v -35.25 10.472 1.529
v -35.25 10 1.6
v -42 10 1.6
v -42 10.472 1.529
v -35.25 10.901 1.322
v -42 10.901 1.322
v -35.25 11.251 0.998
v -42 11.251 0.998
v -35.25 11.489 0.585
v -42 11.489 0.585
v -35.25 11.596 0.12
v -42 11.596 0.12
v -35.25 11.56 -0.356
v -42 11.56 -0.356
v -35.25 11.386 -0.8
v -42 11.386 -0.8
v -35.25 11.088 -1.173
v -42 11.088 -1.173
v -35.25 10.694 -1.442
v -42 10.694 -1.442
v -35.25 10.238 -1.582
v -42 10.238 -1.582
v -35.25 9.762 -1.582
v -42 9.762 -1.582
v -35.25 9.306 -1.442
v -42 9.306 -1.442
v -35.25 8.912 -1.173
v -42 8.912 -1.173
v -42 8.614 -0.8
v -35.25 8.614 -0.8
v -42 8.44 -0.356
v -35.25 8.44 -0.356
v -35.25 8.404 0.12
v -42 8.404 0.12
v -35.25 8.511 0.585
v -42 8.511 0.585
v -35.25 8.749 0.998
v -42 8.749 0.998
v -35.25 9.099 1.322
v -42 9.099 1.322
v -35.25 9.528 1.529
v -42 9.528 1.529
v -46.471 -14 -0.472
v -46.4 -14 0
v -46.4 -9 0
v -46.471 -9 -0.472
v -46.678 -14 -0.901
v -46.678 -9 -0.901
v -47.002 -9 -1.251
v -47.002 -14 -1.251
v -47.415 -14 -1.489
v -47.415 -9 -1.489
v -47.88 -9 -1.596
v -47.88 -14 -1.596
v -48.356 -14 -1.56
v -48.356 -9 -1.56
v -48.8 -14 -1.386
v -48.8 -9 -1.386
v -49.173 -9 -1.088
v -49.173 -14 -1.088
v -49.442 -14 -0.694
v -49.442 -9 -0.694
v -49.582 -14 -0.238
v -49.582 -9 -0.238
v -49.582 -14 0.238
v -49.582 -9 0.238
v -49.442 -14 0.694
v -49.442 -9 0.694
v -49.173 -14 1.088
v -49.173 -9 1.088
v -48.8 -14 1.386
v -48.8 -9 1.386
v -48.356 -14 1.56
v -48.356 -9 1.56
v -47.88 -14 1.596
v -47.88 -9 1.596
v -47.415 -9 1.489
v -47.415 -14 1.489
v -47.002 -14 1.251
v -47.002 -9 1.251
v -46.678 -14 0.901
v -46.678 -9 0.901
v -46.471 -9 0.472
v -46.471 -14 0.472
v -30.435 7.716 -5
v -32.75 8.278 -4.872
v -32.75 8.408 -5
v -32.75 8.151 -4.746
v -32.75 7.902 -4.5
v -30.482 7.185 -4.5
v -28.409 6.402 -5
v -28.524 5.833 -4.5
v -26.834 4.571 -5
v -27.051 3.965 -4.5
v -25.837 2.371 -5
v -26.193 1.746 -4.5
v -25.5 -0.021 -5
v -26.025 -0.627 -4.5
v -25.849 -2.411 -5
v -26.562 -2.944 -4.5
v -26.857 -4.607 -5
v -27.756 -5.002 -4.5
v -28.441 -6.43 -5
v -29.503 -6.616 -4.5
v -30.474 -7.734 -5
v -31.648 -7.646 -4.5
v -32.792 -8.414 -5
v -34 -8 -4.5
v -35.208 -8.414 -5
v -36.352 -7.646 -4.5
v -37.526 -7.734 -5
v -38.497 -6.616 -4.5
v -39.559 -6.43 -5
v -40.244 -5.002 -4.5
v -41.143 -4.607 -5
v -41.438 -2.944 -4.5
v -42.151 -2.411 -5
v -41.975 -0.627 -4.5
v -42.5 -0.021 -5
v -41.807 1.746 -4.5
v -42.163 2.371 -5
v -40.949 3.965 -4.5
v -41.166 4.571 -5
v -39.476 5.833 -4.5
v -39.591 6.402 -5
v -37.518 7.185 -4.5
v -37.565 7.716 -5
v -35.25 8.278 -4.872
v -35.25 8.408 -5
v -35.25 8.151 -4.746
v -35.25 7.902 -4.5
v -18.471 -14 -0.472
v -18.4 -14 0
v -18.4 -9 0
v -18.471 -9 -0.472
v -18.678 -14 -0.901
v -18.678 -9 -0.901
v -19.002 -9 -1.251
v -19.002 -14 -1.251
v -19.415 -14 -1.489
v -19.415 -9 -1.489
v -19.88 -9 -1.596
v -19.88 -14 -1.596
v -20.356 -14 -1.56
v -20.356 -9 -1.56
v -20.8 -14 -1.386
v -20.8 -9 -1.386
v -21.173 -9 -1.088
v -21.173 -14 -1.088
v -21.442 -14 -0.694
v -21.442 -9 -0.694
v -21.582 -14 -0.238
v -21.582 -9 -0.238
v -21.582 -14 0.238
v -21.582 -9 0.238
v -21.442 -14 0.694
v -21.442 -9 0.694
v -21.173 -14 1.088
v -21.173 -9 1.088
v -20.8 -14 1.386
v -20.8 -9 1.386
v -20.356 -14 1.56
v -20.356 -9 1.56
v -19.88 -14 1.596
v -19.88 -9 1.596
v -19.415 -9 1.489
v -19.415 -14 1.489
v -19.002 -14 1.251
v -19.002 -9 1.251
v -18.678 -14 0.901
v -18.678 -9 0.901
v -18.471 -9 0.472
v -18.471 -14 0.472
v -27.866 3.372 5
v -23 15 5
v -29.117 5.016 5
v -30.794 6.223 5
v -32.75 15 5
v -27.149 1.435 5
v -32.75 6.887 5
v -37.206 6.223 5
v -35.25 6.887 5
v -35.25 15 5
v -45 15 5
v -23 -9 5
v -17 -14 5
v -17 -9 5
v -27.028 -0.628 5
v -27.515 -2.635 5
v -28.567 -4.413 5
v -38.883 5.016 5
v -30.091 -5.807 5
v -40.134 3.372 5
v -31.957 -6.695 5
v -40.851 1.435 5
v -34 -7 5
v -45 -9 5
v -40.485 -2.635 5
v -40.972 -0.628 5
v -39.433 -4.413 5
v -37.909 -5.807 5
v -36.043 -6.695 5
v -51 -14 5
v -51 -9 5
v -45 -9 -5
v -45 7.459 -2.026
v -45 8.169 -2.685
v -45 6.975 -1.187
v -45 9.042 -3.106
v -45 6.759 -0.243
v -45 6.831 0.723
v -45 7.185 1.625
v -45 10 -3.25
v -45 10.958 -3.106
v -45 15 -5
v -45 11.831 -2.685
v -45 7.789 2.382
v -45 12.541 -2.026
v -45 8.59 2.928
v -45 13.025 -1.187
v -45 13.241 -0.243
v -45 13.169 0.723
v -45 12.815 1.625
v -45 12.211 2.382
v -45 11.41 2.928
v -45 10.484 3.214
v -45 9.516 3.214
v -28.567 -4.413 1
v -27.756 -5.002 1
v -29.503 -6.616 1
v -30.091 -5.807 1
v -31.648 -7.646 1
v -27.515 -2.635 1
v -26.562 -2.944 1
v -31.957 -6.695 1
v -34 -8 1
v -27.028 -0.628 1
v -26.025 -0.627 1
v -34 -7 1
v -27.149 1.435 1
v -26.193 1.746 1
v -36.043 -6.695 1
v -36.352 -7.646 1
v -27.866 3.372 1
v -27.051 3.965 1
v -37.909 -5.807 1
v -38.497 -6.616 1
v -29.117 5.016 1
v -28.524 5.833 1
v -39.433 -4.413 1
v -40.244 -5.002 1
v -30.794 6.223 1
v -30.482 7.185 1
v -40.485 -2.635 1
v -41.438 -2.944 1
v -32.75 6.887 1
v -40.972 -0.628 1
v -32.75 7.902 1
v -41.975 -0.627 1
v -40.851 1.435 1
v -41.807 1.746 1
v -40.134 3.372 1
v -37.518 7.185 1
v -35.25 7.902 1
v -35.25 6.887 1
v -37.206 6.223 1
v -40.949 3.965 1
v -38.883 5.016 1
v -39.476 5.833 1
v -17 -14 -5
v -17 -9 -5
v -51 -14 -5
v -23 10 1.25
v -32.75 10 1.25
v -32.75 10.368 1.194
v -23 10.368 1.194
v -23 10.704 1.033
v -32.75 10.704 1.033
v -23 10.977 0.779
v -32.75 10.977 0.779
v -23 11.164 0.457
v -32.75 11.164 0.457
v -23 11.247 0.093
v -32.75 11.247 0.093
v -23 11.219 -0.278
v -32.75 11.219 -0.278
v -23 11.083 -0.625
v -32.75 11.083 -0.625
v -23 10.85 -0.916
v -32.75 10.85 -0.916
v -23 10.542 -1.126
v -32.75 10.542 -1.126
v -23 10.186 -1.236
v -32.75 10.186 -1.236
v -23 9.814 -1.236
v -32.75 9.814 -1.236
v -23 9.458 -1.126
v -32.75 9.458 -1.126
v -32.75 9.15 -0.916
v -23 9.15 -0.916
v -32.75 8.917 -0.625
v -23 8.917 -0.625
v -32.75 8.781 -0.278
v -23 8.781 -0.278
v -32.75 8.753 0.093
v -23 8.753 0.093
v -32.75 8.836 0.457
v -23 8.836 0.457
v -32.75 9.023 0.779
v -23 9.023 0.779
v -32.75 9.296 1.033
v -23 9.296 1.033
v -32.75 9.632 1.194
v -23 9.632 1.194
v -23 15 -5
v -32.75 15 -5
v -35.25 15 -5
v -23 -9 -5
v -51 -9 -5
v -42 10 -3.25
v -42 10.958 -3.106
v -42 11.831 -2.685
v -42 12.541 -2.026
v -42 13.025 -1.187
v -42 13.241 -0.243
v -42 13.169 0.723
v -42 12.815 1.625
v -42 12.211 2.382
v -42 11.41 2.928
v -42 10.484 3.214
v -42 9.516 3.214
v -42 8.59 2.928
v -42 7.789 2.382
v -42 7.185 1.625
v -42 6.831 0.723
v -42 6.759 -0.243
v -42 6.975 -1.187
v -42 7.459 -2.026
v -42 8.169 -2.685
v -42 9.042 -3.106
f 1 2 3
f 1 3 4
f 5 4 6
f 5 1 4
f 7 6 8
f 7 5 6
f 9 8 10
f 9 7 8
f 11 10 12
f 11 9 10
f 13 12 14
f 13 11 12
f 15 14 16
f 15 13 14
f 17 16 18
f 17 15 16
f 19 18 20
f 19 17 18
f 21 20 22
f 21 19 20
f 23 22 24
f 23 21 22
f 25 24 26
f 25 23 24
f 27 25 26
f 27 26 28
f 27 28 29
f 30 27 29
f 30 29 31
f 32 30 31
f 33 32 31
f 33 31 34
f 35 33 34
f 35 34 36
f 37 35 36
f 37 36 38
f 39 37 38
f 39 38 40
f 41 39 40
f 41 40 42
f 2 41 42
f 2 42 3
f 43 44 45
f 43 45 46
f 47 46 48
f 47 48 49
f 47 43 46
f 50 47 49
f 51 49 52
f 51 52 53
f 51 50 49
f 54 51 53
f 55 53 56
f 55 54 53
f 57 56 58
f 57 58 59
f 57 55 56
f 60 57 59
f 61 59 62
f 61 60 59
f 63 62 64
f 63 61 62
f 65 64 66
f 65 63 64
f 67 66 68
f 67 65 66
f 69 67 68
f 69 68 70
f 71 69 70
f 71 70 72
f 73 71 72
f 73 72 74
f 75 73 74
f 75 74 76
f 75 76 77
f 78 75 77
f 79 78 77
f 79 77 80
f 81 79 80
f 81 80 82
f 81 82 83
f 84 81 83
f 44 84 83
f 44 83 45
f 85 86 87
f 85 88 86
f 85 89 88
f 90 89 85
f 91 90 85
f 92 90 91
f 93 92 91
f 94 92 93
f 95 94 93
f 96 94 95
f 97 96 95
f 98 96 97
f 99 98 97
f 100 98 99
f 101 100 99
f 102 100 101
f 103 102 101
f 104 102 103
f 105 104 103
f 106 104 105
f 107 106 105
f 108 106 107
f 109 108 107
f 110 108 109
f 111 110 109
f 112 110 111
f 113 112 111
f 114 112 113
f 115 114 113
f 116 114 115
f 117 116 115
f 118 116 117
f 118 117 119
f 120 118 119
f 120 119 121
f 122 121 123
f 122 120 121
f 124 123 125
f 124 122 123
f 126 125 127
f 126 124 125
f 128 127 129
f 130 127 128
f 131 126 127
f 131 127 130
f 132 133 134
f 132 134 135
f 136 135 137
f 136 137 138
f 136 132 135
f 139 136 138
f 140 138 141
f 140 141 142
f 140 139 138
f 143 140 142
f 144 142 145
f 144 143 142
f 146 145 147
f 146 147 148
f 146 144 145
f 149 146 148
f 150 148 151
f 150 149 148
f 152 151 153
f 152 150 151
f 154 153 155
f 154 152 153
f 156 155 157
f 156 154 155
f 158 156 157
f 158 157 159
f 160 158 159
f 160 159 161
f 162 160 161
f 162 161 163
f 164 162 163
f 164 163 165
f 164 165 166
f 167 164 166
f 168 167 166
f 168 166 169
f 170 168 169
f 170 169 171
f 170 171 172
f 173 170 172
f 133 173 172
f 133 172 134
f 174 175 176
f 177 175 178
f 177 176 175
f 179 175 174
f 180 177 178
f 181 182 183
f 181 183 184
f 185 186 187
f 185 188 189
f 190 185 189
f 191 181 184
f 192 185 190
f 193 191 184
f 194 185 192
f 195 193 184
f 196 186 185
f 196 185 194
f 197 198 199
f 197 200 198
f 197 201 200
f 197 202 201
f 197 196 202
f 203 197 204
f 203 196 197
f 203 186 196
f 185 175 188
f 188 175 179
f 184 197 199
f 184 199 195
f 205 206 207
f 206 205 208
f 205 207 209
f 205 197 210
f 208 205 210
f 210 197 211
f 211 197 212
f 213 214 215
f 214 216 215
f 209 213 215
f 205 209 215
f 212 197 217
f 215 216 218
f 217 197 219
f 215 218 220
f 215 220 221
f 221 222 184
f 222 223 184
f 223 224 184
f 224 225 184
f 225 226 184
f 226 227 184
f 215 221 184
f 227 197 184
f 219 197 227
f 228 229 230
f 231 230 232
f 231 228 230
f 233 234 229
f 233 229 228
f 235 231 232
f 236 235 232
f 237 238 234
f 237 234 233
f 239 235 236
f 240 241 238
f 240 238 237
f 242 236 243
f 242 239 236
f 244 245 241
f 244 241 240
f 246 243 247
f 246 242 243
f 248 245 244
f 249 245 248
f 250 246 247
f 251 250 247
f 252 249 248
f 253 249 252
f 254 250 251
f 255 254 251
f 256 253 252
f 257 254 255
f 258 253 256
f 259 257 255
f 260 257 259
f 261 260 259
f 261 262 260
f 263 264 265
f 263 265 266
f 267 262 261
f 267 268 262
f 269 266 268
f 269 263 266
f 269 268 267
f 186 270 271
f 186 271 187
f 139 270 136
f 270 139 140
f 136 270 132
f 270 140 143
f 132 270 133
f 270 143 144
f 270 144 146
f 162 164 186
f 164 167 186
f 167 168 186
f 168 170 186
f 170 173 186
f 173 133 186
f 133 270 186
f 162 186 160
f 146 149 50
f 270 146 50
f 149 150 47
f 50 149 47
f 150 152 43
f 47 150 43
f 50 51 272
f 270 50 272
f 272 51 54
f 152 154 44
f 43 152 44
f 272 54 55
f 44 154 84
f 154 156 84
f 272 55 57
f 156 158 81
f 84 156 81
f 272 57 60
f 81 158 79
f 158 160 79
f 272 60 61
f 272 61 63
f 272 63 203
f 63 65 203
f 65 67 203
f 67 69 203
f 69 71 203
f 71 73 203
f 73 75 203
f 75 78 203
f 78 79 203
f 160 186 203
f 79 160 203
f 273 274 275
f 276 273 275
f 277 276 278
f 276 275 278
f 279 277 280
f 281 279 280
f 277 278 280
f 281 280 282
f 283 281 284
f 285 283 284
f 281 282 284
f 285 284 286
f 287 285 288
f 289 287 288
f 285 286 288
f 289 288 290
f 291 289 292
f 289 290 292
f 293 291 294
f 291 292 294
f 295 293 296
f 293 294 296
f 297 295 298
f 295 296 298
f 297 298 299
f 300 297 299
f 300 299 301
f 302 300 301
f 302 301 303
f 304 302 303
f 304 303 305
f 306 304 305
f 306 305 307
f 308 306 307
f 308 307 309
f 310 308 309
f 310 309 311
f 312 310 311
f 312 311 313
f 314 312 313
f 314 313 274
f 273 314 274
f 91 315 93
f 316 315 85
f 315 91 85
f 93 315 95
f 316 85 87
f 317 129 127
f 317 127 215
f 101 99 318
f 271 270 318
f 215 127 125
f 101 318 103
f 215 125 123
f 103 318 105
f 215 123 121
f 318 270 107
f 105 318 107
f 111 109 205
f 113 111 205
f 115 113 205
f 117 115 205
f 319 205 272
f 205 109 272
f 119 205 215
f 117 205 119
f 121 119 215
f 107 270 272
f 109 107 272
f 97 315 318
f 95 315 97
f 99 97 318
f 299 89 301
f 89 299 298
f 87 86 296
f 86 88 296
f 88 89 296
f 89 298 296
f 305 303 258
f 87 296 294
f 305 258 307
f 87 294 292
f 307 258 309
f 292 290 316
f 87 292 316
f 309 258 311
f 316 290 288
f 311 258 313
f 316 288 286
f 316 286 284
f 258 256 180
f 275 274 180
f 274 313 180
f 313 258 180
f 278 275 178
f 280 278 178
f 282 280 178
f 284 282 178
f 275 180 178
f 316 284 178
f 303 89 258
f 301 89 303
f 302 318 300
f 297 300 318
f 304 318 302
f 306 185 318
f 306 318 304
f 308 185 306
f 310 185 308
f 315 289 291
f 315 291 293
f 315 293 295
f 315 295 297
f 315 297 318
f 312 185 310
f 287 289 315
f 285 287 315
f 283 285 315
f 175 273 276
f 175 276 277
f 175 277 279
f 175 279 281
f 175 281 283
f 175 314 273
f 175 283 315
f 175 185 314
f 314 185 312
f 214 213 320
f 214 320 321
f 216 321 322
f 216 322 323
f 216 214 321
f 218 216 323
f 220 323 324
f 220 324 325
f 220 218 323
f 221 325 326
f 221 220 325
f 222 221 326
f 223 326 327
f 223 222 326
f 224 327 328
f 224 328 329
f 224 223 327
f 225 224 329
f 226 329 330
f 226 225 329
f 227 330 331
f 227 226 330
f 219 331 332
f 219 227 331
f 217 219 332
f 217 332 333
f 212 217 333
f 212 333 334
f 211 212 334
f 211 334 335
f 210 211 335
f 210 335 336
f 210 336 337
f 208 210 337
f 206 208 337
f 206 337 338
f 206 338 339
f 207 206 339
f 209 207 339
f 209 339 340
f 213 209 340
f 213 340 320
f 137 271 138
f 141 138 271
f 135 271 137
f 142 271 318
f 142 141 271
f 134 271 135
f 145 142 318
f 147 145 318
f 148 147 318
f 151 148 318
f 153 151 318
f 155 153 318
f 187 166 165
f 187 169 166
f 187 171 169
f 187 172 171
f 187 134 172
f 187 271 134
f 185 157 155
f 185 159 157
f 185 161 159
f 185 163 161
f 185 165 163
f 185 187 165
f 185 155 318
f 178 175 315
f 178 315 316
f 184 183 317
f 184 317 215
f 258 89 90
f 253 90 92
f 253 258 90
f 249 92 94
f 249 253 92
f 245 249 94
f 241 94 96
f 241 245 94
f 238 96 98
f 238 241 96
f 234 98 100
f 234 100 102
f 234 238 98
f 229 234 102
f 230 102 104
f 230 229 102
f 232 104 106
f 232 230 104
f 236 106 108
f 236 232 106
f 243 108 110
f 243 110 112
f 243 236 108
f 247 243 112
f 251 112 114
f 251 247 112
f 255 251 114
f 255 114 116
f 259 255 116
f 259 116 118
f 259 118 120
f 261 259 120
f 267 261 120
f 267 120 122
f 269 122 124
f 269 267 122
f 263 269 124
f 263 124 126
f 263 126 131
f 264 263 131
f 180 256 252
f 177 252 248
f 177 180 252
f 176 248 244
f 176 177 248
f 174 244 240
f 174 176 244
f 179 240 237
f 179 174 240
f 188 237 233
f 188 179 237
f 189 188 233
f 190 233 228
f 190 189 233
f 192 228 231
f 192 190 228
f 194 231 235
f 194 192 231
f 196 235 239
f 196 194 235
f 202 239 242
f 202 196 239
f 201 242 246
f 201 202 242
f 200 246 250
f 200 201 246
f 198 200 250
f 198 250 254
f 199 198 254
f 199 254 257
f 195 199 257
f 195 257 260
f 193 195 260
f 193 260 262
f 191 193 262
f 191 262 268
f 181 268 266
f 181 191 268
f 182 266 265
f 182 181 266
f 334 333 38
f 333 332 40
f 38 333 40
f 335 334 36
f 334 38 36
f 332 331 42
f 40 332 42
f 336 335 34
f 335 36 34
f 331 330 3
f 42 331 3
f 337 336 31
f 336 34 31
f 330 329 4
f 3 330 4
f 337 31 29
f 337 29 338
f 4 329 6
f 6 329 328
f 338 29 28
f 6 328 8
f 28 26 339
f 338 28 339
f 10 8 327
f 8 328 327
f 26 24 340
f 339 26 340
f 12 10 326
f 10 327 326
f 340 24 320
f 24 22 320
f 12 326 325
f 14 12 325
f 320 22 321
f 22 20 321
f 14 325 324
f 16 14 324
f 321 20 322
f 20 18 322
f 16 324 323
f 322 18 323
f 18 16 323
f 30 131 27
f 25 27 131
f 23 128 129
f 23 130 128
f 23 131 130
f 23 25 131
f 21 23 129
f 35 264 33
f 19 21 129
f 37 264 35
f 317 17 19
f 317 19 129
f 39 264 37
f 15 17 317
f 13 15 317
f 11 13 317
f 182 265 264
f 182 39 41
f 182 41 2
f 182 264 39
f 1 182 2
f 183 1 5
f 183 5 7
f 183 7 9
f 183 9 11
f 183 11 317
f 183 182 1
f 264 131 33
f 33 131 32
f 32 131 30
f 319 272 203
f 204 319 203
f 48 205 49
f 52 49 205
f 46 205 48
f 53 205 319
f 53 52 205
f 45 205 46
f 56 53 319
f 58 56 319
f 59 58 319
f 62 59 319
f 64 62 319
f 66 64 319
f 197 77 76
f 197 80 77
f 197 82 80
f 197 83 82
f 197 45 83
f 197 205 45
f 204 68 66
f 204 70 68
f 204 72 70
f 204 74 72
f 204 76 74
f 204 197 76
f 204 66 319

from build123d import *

# Parameters (mm, degrees)
SKETCH1_W                      = 22
SKETCH1_H                      = 29
BOSS_EXTRUDE1_DEPTH            = 5
SKETCH3_W                      = 34
SKETCH3_H                      = 10
BOSS_EXTRUDE2_DEPTH            = 5
F_16_0_16_DIAMETER_HOLE1_D     = 16
F_16_0_16_DIAMETER_HOLE1_DEPTH = 6
F_14_0_14_DIAMETER_HOLE1_D     = 14
M3_CLEARANCE_HOLE1_D           = 3.2
SKETCH12_W                     = 2.5
SKETCH12_H                     = 8.112511343
CUT_EXTRUDE1_DEPTH             = 25.779023387
CBORE_FOR_M3_SHCS1_D           = 3.2
CBORE_FOR_M3_SHCS1_DEPTH       = 9.75
CBORE_FOR_M3_SHCS1_CBORE_D     = 6.5
CBORE_FOR_M3_SHCS1_CBORE_DEPTH = 3
CHAMFER1_SIZE                  = 0.5
M3X0_5_TAPPED_HOLE1_D          = 2.5


with BuildPart() as part:
    # Sketch1 → Boss-Extrude1 (new, symmetric)
    with BuildSketch(Plane.XY):
        with Locations((0, 0.5)):
            Rectangle(SKETCH1_W, SKETCH1_H)
    extrude(amount=BOSS_EXTRUDE1_DEPTH, both=True)

    # Sketch3 → Boss-Extrude2 (add)
    with BuildSketch(Plane.XZ.offset(14)):
        Rectangle(SKETCH3_W, SKETCH3_H)
    extrude(amount=-BOSS_EXTRUDE2_DEPTH)

    # Ø16.0 (16) Diameter Hole1
    with Locations(Plane(origin=(0, 0, -5), x_dir=(-1, 0, 0), z_dir=(0, 0, -1))):
        with Locations((0, 0)):
            Hole(F_16_0_16_DIAMETER_HOLE1_D / 2, depth=F_16_0_16_DIAMETER_HOLE1_DEPTH)

    # Ø14.0 (14) Diameter Hole1 (through all)
    with Locations(Plane(origin=(0, 0, 1), x_dir=(-1, 0, 0), z_dir=(0, 0, -1))):
        with Locations((0, 0)):
            Hole(F_14_0_14_DIAMETER_HOLE1_D / 2)

    # M3 Clearance Hole1 (through all)
    with Locations(Plane(origin=(0, -9, 0), x_dir=(1, 0, 0), z_dir=(0, 1, 0))):
        with Locations((-14, 0), (14, 0)):
            Hole(M3_CLEARANCE_HOLE1_D / 2)

    # Sketch12 → Cut-Extrude1 (cut, through all)
    with BuildSketch(Plane.XY.offset(5)):
        with Locations((0, 10.943744329)):
            Rectangle(SKETCH12_W, SKETCH12_H)
    extrude(amount=-CUT_EXTRUDE1_DEPTH, mode=Mode.SUBTRACT)

    # CBORE for M3 SHCS1
    with Locations(Plane(origin=(11, 0, 0), x_dir=(0, 0, -1), z_dir=(1, 0, 0))):
        with Locations((0, 10)):
            CounterBoreHole(CBORE_FOR_M3_SHCS1_D / 2, CBORE_FOR_M3_SHCS1_CBORE_D / 2, CBORE_FOR_M3_SHCS1_CBORE_DEPTH, depth=CBORE_FOR_M3_SHCS1_DEPTH)

    # Chamfer1
    chamfer1_edges = [part.edges().sort_by_distance(p)[0] for p in [
        (0, -8, -5),
    ]]
    chamfer(chamfer1_edges, length=CHAMFER1_SIZE)


with BuildPart() as body_2:
    # Mirror1: mirrored copy
    add(part.part.mirror(Plane(origin=(-17, -9, -5), x_dir=(0, 0, 1), z_dir=(-1, 0, 0))))

    # M3x0.5 Tapped Hole1 (through all)
    with Locations(Plane(origin=(-23, 0, 0), x_dir=(0, 0, -1), z_dir=(1, 0, 0))):
        with Locations((0, 10)):
            Hole(M3X0_5_TAPPED_HOLE1_D / 2)


solid = body_2.part
